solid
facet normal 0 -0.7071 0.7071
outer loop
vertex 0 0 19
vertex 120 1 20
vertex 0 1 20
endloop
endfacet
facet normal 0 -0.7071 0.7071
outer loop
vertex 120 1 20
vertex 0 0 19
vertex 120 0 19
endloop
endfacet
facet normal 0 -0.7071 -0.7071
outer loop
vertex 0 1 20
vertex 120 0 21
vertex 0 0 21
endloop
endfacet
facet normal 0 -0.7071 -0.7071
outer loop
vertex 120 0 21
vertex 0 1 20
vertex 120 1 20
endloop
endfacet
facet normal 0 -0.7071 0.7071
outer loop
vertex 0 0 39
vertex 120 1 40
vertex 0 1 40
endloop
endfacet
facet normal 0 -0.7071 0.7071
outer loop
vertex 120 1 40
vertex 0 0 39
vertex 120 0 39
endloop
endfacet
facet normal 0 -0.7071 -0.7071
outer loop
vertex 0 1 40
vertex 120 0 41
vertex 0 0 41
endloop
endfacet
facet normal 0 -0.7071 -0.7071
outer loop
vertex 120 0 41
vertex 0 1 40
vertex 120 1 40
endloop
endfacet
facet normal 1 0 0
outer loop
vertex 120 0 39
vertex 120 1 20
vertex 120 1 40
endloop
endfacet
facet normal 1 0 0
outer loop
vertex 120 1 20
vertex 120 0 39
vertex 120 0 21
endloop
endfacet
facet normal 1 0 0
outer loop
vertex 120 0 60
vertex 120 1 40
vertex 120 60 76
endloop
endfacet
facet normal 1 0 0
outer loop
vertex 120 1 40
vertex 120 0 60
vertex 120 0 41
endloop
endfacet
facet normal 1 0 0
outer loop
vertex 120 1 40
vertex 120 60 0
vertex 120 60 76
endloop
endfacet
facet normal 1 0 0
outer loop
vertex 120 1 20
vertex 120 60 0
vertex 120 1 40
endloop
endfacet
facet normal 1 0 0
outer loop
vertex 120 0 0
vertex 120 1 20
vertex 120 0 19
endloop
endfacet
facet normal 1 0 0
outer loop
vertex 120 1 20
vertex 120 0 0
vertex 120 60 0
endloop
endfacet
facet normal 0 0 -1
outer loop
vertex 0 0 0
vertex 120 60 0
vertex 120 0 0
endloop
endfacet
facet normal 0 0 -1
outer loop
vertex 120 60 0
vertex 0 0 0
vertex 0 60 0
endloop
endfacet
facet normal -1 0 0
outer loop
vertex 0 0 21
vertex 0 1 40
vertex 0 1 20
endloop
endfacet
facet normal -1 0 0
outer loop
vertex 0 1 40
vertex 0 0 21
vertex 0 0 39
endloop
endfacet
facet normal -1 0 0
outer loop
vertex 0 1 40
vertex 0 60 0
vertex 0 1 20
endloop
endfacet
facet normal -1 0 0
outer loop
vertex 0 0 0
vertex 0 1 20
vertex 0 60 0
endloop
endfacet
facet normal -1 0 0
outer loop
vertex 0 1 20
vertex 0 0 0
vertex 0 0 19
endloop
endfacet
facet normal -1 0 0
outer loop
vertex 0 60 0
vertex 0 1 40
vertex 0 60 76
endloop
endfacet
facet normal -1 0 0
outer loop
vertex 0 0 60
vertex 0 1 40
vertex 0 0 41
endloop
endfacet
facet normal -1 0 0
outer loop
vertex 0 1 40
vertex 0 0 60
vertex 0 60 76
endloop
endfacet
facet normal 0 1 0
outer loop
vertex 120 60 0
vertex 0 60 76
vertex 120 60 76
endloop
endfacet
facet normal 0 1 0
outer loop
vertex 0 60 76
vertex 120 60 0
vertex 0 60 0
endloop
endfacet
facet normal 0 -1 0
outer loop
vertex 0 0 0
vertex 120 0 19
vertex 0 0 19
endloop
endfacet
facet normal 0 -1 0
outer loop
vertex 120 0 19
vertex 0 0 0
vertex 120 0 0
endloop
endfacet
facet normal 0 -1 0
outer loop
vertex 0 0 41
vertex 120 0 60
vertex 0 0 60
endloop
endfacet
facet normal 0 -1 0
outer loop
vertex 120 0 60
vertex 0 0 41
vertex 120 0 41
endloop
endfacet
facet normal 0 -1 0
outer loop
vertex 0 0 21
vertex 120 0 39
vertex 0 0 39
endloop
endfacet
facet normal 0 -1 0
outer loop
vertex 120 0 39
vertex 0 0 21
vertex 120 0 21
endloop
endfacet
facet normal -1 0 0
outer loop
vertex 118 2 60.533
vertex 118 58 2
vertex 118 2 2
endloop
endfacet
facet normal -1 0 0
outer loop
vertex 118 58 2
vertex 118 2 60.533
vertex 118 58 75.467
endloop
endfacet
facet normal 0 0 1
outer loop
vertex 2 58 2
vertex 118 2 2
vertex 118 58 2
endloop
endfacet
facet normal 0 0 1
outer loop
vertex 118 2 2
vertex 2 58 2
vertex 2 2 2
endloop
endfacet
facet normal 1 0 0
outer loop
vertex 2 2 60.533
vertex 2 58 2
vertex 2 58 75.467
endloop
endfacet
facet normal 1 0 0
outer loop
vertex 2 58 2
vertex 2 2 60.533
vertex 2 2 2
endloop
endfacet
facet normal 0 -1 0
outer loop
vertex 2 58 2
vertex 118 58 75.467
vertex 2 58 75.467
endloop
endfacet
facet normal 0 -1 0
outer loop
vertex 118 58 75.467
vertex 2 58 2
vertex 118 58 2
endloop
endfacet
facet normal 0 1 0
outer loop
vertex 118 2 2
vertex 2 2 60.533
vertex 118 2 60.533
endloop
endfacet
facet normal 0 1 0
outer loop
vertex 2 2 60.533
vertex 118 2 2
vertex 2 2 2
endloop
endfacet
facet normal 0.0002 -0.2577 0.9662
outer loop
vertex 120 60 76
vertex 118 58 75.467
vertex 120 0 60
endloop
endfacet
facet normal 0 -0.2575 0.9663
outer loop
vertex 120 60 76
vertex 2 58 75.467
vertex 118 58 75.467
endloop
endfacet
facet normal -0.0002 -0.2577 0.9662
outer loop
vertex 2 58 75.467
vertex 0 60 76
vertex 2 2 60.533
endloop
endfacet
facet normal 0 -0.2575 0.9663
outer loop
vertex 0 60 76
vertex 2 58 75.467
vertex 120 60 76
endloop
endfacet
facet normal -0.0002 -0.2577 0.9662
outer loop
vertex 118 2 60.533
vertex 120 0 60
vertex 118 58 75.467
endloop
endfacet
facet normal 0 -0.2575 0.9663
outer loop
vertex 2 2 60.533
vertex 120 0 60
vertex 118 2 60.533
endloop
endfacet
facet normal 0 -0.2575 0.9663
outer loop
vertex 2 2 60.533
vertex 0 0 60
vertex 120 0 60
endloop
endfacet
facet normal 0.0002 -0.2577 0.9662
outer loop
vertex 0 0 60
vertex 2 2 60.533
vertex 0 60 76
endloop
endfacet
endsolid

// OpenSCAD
// file: ../../lib/logic.scad
use <./strings.scad>

function int(s, total=0, i=0) = (i == len(s))
  ? total
  : int(s, total*10 + ord(s[i]) - ord("0"), i+1);

function frac(s) = int(s) / pow(10, len(s));

function num(s) =
  let (parts = split(s, "."))
  len(parts) == 1
  ? int(parts[0])
  : int(parts[0]) + frac(parts[1]);

function any(list, i=0) = (i == len(list))
  ? false
  : list[i] || any(list, i+1);

function all(list, i=0) = (i == len(list))
  ? true
  : list[i] && all(list, i+1);

function is_int_string(s) = all([for(c=s) "0" <= c && c <= "9"]);

function is_num_string(s) =
  let (parts = split(s, "."))
  len(parts) == 1
  ? is_int_string(parts[0])
  : len(parts) == 2
    ? is_int_string(parts[0]) && is_int_string(parts[1])
    : false;

function _test_logic() =
  assert (int("123") == 123)
  assert (int("9999") == 9999)
  assert (frac("5") == 0.5)
  assert (frac("33333") == 0.33333)
  assert (frac("111111") == 0.111111)
  assert (frac("02") == 0.02)
  assert (frac("020000") == 0.02)
  assert (frac("0") == 0)
  assert (frac("0000000000000") == 0)
  assert (frac("0000000000001") == 0.0000000000001)
  assert (num("123") == 123)
  assert (num("2.75") == 2.75)
  assert (num("1234.991230149") == 1234.991230149) // I'm kinda shocked that works
  assert (any([false, "", 0, []]) == false)
  assert (any([false, "", 0, [], 1]) == true)
  assert (any([]) == false)
  assert (all([1, true, "a"]) == true)
  assert (all([1, true, "a", ""]) == false)
  assert (all([]) == true)
  assert (is_int_string("1234") == true)
  assert (is_int_string("093999914") == true)
  assert (is_int_string("123A") == false)
  assert (is_int_string("two") == false)
  assert (is_int_string("2.6") == false)
  assert (is_num_string("2.6") == true)
  assert (is_num_string("1241422.5522106") == true)
  assert (is_num_string("124142205522106") == true)
  assert (is_num_string("1241422,5522106") == false)
  assert (is_num_string("1241422.552.106") == false)
  assert (is_num_string("1241422Q") == false)
  "test logic success";

echo(_test_logic());
// file: ../../lib/props.scad
use <./logic.scad>
use <./strings.scad>

// Global prop function.
// The idea here is to define a function like:
//   function prop(key) = getprop(key, global_props);
// and then use that to share variables throughout your multi-file design.
// A bunch of expressions are available within the props dictionary, like
// references to other props, and various computations. Whitespace
// is strict in the expressions.
props_example = [
  ["key1", 1],
  ["key2", 2],
  ["key3", 3],
  ["key4", "$key3 * 20"],
  ["namespace.value1", 8],
  ["namespace.value2", "$key2"],
  ["othernamespace.value1", "$namespace.value2"],
  ["s", "hello"],
  ["e1", "$key3 / 2"],
  ["e2", "$namespace.value2 + 1.275"],
  ["e3", "$othernamespace.value1 * 6"],
  ["e4", "$key2 ^ 6"],
  ["e5", "$key3 % 2"],
  ["e6", "cos $key4"],
  ["p1", "$key3 * ($key2 + $key1)"],
  ["p2", "(1 + 2) * (2 ^ 3)"],
  ["p3", "((1 + $e5) + 1) + (cos $key4)"],
  ["zero", 0],
  ["false", false],
  ["undef", undef],
  ["empty-array", []],
];

function eval_literal(args) =
  // compute things like `2 + 4` or `cos 45`
  len(args) == 0 ? undef :
  args[0] == "norm" ? norm([for(i=[1:len(args)-1]) args[i]]) :
  len(args) == 3
  ? args[1] == "/" ? args[0] / args[2]
    : args[1] == "*" ? args[0] * args[2]
    : args[1] == "+" ? args[0] + args[2]
    : args[1] == "-" ? args[0] - args[2]
    : args[1] == "^" ? args[0] ^ args[2]
    : args[1] == "%" ? args[0] % args[2]
    : undef
  : len(args) == 2
    ? args[0] == "sin" ? sin(args[1])
      : args[0] == "cos" ? cos(args[1])
      : args[0] == "tan" ? tan(args[1])
      : args[0] == "asin" ? asin(args[1])
      : args[0] == "acos" ? acos(args[1])
      : args[0] == "atan" ? atan(args[1])
      : args[0] == "sqrt" ? sqrt(args[1])
      : undef
    : len(args) == 1
      ? args[0]
      : undef;

function eval_raw(expression, props) =
  // resolve types and props in expressions, like "(cos $thing) * ($other / 3)"
  // note that whitespace is not ignored
  !is_string(expression)
  ? expression
  : !contains(expression, "(")
    ? // simple expression like "$thing + 5"
      eval_literal([
        for (arg=split(expression))
          arg[0] == "$"
          ? getprop(substr(arg, start=1), props)
          : is_num_string(arg)
            ? num(arg)
            : arg
      ])
    : // resolve the innermost parens and start again
      let (inner_start = last(expression, "("),
           inner_end = first(expression, ")", after=inner_start),
           inner = eval_raw(substr(expression, inner_start+1, inner_end), props))
      eval_raw(replace_substr(expression, inner, inner_start, inner_end+1), props);

function getprop(key, props) =
  let (prop = props[search([key], props)[0]][1])
  assert (prop != undef, str("Missing key in properties: ", key))
  let (result = eval_raw(prop, props))
  assert (result != undef, str("Invalid expression in properties: ", prop))
  result;

function _test_props() =
  assert (getprop("key3", props_example) == 3)
  assert (getprop("namespace.value2", props_example) == 2)
  assert (getprop("e1", props_example) == 1.5)
  assert (getprop("e2", props_example) == 3.275)
  assert (getprop("e3", props_example) == 12)
  assert (getprop("e4", props_example) == 64)
  assert (getprop("e5", props_example) == 1)
  assert (getprop("e6", props_example) == 0.5)
  assert (getprop("p1", props_example) == 9)
  assert (getprop("p2", props_example) == 24)
  assert (getprop("p3", props_example) == 3.5)
  assert (getprop("s", props_example) == "hello")
  assert (getprop("zero", props_example) == 0)
  assert (getprop("false", props_example) == false)
  assert (getprop("empty-array", props_example) == [])
  "test props success";

echo(_test_props());
// file: ../../lib/strings.scad
function contains(list, item, i=0) = (i == len(list))
  ? false
  : list[i] == item || contains(list, item, i+1);

function strcat(char_array, i=0, r="") = (i == len(char_array))
  ? r
  : strcat(char_array, i+1, str(r, char_array[i]));

function substr(s, start=0, limit=undef) =
  // return str[i] where start <= i < limit
  let (end = limit == undef ? len(s)-1 : min(limit-1, len(s)-1))
  end < start
  ? ""
  : strcat([for (i=[start:end]) s[i]]);

function contains_substr(s, sub) =
  // return true if substr is found anywhere in s
  let (list = [for (i=[0:1:len(s)-len(sub)]) substr(s, start=i, limit=i+len(sub))])
  contains(list, sub);

function replace_substr(s, repl, start=0, limit=undef) =
  // remove a substring and replace it with another string
  let (end = limit == undef ? len(s)-1 : limit-1)
  str(substr(s, limit=start), repl, substr(s, start=end+1));

function split(s, separator=" ", parts=[]) =
  let (match=search(separator, s, 0)[0])
  match == []
  ? concat(parts, [s])
  : split(substr(s, start=match[0]+1), separator, concat(parts, [substr(s, limit=match[0])]));

function first(string, char, after=-1) =
  let (result = search(char, substr(string, start=after+1), 1))
  result == []
  ? undef
  : result[0] + after+1;

function last(string, char) =
  let (result=search(char, string, 0))
  result == []
  ? undef
  : result[0][len(result[0])-1];

function _test_strings() =
  assert (contains("abcd", "d") == true)
  assert (contains("abcd", "Q") == false)
  assert (contains([1, 2, 3, 4], 1) == true)
  assert (contains([1, 2, 3, 4], 5) == false)
  assert (contains([["a"], 2, [], ""], []) == true)
  assert (contains([["a"], 2, [], ""], ["a"]) == true)
  assert (contains([["a"], 2, [], ""], ["b"]) == false)
  assert (strcat([]) == "")
  assert (strcat(["a"]) == "a")
  assert (strcat(["a", "b"]) == "ab")
  assert (strcat(["a", "", "b"]) == "ab")
  assert (substr("abcde") == "abcde")
  assert (substr("abcde", start=0) == "abcde")
  assert (substr("abcde", start=1) == "bcde")
  assert (substr("abcde", limit=3) == "abc")
  assert (substr("abcde", start=2, limit=4) == "cd")
  assert (substr("abcde", start=99) == "")
  assert (contains_substr("abcde", "a") == true)
  assert (contains_substr("abcde", "ab") == true)
  assert (contains_substr("abcde", "abcde") == true)
  assert (contains_substr("abcde", "de") == true)
  assert (contains_substr("abcde", "Q") == false)
  assert (contains_substr("abcde", "abcdefghijklmnop") == false)
  assert (contains_substr("abcde", "e*") == false)
  assert (contains_substr("abcde", "") == true)
  assert (replace_substr("abcde", "CD", start=2, limit=4) == "abCDe")
  assert (replace_substr("abcde", "CD", start=2, limit=5) == "abCD")
  assert (replace_substr("abcde", "CD", start=2, limit=999) == "abCD")
  assert (replace_substr("abcde", "CD", start=2) == "abCD")
  assert (replace_substr("abcde", "AAA", start=0) == "AAA")
  assert (replace_substr("abcde", "AAA") == "AAA")
  assert (replace_substr("abcde", "III", limit=0) == "IIIabcde")
  assert (replace_substr("abcde", "III", start=3, limit=3) == "abcIIIde")
  assert (replace_substr("abcde", "III", start=5) == "abcdeIII")
  assert (replace_substr("abcde", "III", start=999) == "abcdeIII")
  assert (split("abc,defg,hi", ",") == ["abc", "defg", "hi"])
  assert (split("abc,defg,hi", "#") == ["abc,defg,hi"])
  assert (split(",,ab,c,,d,efg", ",") == ["", "", "ab", "c", "", "d", "efg"])
  assert (split("a b  cd ") == ["a", "b", "", "cd", ""])
  assert (split("abcd") == ["abcd"])
  assert (first("aaaaa", "a") == 0)
  assert (first("00aaa", "a") == 2)
  assert (first("0000a", "a") == 4)
  assert (first("0000a", "Z") == undef)
  assert (first("aaaaa", "a", after=2) == 3)
  assert (first("aaa00", "a", after=2) == undef)
  assert (first("a000a", "a", after=0) == 4)
  assert (first("a000a", "a", after=99) == undef)
  assert (last("aaaaa", "a") == 4)
  assert (last("aaa00", "a") == 2)
  assert (last("a0000", "a") == 0)
  assert (last("a0000", "Z") == undef)
  "test strings success";

echo(_test_strings());
// file: props.scad
use <../../lib/props.scad>

global_props = [
  // basic exterior dimensions
  ["bin.depth", 60],
  ["bin.width", 120],
  ["bin.front.height", 60],
  ["bin.back.height", 76],
  ["panel.thickness", 2],

  // lid/hinge
  ["lid.angle", "atan (($bin.back.height - $bin.front.height) / $bin.depth)"],
  ["lid.length", "norm $bin.depth ($bin.back.height - $bin.front.height)"],
  ["lid.cutout.radius", "$hinge.radius + $panel.thickness"],
  ["hinge.radius", 4],
  ["hinge.length", "$bin.width"],

  // hinge fin position
  ["hinge.fin.start", "$panel.thickness + 0.2"],
  ["hinge.fin.end", "$hinge.length - $hinge.fin.start"],
  ["hinge.fin.count", 5],

  // hinge fin shape
  ["hinge.fin.length", "$lid.length - $panel.thickness"],
  ["hinge.fin.width", 2.31],
  ["hinge.fin.height", "$hinge.radius * 2"],
  ["hinge.fin.taper.angle", 40],
  ["hinge.fin.margin", 0.2],

  // hinge pin
  ["hinge.pin.radius", 2],
  ["hinge.pin.margin", 0.2],
  ["hinge.pin.start", "$panel.thickness / 2"],
  ["hinge.pin.end", "$hinge.length - $hinge.pin.start"],
];

function prop(key) = getprop(key, global_props);
// file: ../../lib/shapes.scad
use <./strings.scad>

$fa = $preview ? 1 : .1;
$fs = $preview ? 1 : .1;

// Beginnings of a 3d shapes library. I want shapes with a "margin" property
// and possibly specific overrides for margins in a particular direction.
// The idea is to add a thickness around the outside of the entire shape
// without changing the center of the shape. This can be used with
// `difference` to carve out space for shapes to fit, with adjustable
// tolerance.

// given on="x+,y+" or whatever, figure out the translation vector
function _t(on, x=0, y=0, z=0) = 
  let(t = split(on, ","))
  (contains(t, "x+") ? [ x, 0, 0] : [0, 0, 0]) +
  (contains(t, "x-") ? [-x, 0, 0] : [0, 0, 0]) +
  (contains(t, "y+") ? [0,  y, 0] : [0, 0, 0]) +
  (contains(t, "y-") ? [0, -y, 0] : [0, 0, 0]) +
  (contains(t, "z+") ? [0, 0,  z] : [0, 0, 0]) +
  (contains(t, "z-") ? [0, 0, -z] : [0, 0, 0]);

module prism(
  n=undef,
  r=undef, side=undef, // must specify one of r or side length
  z=undef, // thickness (in z direction)
  on="origin", // placement: origin | x+ | z+,y- | etc
  margin=0,       // global margin
  margin_r=undef, margin_side=undef, // override r margin
  margin_z=undef, // override z margin
  chamfer=0,
) {
  a = 180/n;
  margin_side = margin_side == undef ? margin : margin_side;
  margin_r = margin_r == undef ? margin_side/cos(a) : margin_r;
  margin_z = margin_z == undef ? margin : margin_z;
  r = r == undef ? side/(2*sin(a)) : r;
  translate(_t(on, y=r*cos(a), z=z/2))
    rotate([0, 0, 90 - (n%2 == 0 ? a : 0)])
      if (chamfer > 0) {
        // chamfer should be measured in distance perpendicular to the side, which is at
        // angle `a` from `r` (i.e. the same angle we have to rotate if n is odd.
        cz = chamfer;
        cr = chamfer/cos(a);
        // TODO chamfer should depend on the margin, but it's pretty tedious
        // for a small gain
        translate([0, 0, (z + 2*margin_z - cz)/2])
          cylinder(h=cz, r1=r + margin_r, r2=r + margin_r - cr, $fn=n, center=true);
        cylinder(h=z + 2*margin_z - 2*cz, r=r + margin_r, $fn=n, center=true);
        translate([0, 0, -(z + 2*margin_z - cz)/2])
          cylinder(h=cz, r2=r + margin_r, r1=r + margin_r - cr, $fn=n, center=true);
      } else {
        cylinder(h=z + 2*margin_z, r=r + margin_r, $fn=n, center=true);
      }
}



//difference() {
//  %prism(n=5, r=8, z=4, chamfer=1, on="y+,z-", margin=1);
//  prism(n=5, r=8, z=4, chamfer=1, on="y+,z-");
//}

module box(
  x=undef, y=undef, z=undef,  // 3 ways to specify size
  on="origin", // placement: origin | x+ | z+,y- | etc
  margin=0, // global margin
  margin_x=undef,  // override margins
  margin_y=undef,
  margin_z=undef,
  chamfer=0, // flatten the corners
) {
  s = is_num(z)  ? [x, y, z]  // size: x=num, y=num, z=num
    : is_list(x) ? x          //   or: x=[num, num, num]
    : [x, x, x];              //   or: x=num
  m = [
    margin_x == undef ? margin : margin_x,
    margin_y == undef ? margin : margin_y,
    margin_z == undef ? margin : margin_z
  ];

  translate(_t(on, x=s.x/2, y=s.y/2, z=s.z/2))
    if (chamfer > 0) {
      // This looks pretty wild, but I just want to maintain a minimum margin
      // in each of the specified directions from the chamfer, so to keep the
      // chamfer angles all at 45, you need take the smallest chamfer out of
      // the big shape (box + margins) that maintains the right margin
      // distance in each direction.
      cyz = 2*(min(m.y, m.z) + chamfer);
      cxz = 2*(min(m.x, m.z) + chamfer);
      cxy = 2*(min(m.x, m.y) + chamfer);
      intersection() {
        cube(s + 2*m, center=true);
        rotate([45,0,0])
          cube([
            s.x + 2*m.x + 1,
            (s.y + 2*m.y + s.z + 2*m.z - cyz)/sqrt(2),
            (s.y + 2*m.y + s.z + 2*m.z - cyz)/sqrt(2)
          ], center=true);
        rotate([0,45,0])
          cube([
            (s.x + 2*m.x + s.z + 2*m.z - cxz)/sqrt(2),
            s.y + 2*m.y + 1,
            (s.x + 2*m.x + s.z + 2*m.z - cxz)/sqrt(2)
          ], center=true);
        rotate([0,0,45])
          cube([
            (s.x + 2*m.x + s.y + 2*m.y - cxy)/sqrt(2),
            (s.x + 2*m.x + s.y + 2*m.y - cxy)/sqrt(2),
            s.z + 2*m.z + 1
          ], center=true);
      }
    } else {
      cube(s + 2*m, center=true);
    }
}

//difference() {
//  box(10, 20, 30, chamfer=4, margin=1, margin_x=2);
//  box(10, 20, 30, chamfer=4);
//  // see through to the chamfer on different margins
//  color("red") box(100, on="z+");
//}

//box(1, chamfer=.1, on="z+,x-");
//%box(x=10, y=10, z=.1, on="z+,x-");
// main file
use <../../lib/shapes.scad>
use <props.scad>
$fa = $preview ? 1 : .1;
$fs = $preview ? 1 : .1;

module bin(
  width=prop("bin.width"),
  depth=prop("bin.depth"),
  front_height=prop("bin.front.height"),
  back_height=prop("bin.back.height"),
  panel_thickness=prop("panel.thickness"),
  lid_angle=prop("lid.angle"),
) {
  difference() {
    // bin-sized block
    box(x=width, y=depth, z=back_height, on="x+,y+,z+");

    // carve out interior
    box(x=width, y=depth, z=999, on="x+,y+,z+", margin=-panel_thickness);

    // slice off the top
    translate([0, 0, front_height])
      rotate([lid_angle, 0, 0])
        box(999, on="z+");

    // carve out the horizontal grooves on the front
    for (h=[1/3, 2/3]) {
      translate([0, panel_thickness/2, front_height*h])
        rotate([45, 0, 0])
          box(999, on="y-,z+");
    }
  }
}

bin();
